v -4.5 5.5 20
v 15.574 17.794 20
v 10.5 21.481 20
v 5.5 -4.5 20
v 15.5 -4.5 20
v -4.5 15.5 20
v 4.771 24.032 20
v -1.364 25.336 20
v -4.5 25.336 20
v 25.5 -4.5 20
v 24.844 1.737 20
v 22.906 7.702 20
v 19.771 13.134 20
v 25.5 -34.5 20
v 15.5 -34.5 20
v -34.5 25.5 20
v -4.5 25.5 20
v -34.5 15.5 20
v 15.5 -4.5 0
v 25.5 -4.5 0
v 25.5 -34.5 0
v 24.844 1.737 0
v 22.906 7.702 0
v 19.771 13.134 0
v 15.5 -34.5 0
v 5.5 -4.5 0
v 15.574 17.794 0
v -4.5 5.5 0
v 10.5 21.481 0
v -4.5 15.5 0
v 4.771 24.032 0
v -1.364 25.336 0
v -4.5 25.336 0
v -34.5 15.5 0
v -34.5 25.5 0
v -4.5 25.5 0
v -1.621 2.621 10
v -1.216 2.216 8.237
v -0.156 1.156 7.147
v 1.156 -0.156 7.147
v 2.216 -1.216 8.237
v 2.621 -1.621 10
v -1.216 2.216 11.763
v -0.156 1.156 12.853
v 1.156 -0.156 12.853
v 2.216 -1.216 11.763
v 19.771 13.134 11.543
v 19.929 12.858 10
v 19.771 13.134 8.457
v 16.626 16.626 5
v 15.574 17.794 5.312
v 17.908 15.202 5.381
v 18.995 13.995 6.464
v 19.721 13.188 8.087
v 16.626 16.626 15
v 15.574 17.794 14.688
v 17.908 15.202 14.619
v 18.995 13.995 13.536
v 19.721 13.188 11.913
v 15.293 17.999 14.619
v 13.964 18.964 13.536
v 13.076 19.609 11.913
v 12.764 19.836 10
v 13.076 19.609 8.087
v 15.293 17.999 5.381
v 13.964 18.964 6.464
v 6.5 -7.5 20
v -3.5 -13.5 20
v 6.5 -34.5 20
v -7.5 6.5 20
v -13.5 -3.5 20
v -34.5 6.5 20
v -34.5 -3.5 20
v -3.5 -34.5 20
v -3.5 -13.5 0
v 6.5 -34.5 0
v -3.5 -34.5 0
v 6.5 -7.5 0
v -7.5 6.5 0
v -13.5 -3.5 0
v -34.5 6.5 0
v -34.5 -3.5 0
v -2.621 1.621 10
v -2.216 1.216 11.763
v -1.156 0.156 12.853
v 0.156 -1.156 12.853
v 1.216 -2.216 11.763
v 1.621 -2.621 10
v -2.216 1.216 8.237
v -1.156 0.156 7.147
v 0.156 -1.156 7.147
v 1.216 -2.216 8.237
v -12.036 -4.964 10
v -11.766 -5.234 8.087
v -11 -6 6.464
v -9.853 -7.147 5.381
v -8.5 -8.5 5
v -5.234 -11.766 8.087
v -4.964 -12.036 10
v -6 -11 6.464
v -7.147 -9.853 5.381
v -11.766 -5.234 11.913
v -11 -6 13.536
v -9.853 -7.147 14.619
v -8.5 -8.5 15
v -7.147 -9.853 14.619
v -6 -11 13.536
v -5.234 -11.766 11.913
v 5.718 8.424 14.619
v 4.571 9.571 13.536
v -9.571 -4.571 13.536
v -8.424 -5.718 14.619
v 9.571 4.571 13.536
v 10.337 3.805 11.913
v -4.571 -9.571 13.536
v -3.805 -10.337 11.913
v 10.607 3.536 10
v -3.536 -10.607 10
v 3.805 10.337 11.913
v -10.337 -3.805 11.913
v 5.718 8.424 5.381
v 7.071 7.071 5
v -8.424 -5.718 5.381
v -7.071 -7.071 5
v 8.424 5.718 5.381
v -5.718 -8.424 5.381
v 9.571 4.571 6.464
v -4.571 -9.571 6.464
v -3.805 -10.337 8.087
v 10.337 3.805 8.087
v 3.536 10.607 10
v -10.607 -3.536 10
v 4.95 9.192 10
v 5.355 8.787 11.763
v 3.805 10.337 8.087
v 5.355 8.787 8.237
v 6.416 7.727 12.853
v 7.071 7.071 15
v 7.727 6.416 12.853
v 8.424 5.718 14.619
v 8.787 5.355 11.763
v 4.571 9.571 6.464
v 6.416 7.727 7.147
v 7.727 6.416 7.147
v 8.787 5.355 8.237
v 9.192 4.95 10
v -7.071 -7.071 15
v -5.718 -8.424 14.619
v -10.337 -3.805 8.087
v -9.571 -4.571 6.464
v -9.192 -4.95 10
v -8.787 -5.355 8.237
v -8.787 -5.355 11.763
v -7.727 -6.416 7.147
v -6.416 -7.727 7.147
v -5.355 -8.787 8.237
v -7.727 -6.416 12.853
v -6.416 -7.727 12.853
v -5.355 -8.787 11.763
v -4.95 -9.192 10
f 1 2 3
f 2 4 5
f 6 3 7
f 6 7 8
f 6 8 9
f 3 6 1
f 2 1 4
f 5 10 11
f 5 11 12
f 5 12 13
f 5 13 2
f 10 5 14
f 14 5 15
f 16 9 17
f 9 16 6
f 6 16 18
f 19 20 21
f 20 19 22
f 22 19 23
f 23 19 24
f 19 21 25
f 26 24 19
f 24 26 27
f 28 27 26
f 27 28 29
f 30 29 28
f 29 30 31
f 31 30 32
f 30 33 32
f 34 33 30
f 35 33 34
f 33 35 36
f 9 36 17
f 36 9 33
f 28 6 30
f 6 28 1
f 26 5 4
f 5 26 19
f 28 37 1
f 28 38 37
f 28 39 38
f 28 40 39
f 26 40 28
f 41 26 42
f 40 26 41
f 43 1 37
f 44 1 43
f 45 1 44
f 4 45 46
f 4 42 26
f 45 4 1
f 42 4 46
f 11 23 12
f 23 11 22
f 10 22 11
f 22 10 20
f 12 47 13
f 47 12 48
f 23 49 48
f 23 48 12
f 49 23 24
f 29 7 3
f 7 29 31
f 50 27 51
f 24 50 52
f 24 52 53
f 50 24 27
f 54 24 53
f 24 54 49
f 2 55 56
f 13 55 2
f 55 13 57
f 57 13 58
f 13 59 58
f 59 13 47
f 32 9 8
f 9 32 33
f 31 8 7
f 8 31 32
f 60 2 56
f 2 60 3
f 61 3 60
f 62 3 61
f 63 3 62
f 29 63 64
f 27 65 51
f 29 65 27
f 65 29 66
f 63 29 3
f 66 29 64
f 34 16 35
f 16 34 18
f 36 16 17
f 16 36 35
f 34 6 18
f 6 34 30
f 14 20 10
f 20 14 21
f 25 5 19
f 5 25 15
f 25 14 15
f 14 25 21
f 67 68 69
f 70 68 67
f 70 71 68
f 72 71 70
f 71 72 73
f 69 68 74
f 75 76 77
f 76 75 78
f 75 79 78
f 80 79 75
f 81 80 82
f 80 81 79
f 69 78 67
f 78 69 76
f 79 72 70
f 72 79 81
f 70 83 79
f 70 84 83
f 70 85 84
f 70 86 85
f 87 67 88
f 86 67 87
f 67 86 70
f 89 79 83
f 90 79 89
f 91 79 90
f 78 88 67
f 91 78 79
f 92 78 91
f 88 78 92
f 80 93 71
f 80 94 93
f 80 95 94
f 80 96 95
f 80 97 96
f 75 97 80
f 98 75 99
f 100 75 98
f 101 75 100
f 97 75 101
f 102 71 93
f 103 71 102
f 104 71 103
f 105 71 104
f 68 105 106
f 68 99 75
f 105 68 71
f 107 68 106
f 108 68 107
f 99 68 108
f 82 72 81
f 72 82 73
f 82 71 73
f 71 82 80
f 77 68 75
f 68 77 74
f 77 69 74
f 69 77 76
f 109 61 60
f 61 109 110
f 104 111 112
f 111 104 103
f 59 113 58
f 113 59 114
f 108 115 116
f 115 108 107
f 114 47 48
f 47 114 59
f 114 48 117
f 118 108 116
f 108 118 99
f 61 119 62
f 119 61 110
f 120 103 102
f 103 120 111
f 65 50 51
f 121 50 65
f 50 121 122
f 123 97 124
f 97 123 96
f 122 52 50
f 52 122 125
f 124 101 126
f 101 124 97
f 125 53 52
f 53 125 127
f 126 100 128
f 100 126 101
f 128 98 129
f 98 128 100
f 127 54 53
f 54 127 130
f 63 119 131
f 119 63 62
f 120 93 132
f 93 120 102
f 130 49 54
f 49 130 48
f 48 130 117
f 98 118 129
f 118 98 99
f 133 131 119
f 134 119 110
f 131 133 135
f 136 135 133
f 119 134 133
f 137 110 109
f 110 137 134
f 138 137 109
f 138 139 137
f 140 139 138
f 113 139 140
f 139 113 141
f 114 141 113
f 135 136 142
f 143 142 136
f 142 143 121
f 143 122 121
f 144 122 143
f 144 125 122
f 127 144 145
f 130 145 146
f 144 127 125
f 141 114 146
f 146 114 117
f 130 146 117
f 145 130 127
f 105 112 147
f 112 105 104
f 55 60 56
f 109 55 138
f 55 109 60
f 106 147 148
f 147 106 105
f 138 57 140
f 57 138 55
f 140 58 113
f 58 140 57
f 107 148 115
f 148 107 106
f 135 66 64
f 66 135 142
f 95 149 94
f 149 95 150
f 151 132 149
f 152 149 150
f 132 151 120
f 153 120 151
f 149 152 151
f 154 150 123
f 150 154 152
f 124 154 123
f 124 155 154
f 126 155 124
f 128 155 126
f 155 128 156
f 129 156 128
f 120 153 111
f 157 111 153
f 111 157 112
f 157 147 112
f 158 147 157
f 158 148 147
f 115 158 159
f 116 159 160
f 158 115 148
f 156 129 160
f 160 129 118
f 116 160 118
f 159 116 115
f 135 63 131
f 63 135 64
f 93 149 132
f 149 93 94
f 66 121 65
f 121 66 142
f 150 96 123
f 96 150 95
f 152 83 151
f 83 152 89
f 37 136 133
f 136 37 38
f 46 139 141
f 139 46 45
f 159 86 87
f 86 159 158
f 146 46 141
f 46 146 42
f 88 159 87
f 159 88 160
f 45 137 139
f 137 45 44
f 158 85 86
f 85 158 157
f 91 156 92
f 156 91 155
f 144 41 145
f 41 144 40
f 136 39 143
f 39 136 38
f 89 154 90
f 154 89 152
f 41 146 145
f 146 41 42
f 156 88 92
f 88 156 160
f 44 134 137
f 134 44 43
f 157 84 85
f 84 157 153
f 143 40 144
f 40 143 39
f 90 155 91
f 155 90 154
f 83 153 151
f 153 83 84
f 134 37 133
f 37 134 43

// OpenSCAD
bh = 20; // max board width 

bw = 10;  // max board width

al = 30; // arm length

tk = 10; // thickners

// --
//
//bc = bw+2*tk;
//
//difference(){
//union(){
//bc = bw+2*tk;
//cube([bc,bc,bh]);
//
//cube([bc+al,tk,bh]);
//
//cube([tk,bc+al,bh]);
//}
//
////kk =2*tk;
//// translate([kk+tk,kk+tk,tk]) rotate([0,0,45]) cube([tk,tk,bh], center=true);
//}
//
//bc1 = tk;
//#translate([bc1+bw,bc1+bw,0]) cube([bc,bc,bh],$fn=3);

//tk 


module p1(d, bh, tk) {


    difference() {
        cube([d,d,bh]);
        rotate([0,0,45]) translate([0,0,bh/2]) cube([sqrt(2)*tk,sqrt(2)*tk,bh], center=true);
    }
}


d = bw + 2*tk;


difference(){
    
    union(){
        
    // part 1 

    translate([-tk*0.45,-tk*0.45,0])
    union(){
        intersection(){
            p1(d,bh,tk);
            cylinder(r=d,h=bh);
        }


        translate([-al,d-tk,0]) cube([al,tk,bh]);
        translate([d-tk,-al,0]) cube([tk,al,bh]);
    }
//
//
//

    // part 2
    translate([tk*0.65,tk*0.65,0]){

        difference(){    
            rotate([0,0,180]) p1(d,bh,tk+4);

            linear_extrude(height=bh) polygon(points=[[-d,-d],[-d,0],[0,-d]]);
        }

        translate([-al*0.9-tk*1.4,-tk,0]) cube([al*0.9,tk,bh]);
        translate([-tk,-al*0.9-tk*1.4, 0]) cube([tk,al*0.9,bh]);
    }
    
    }
    

    // screw 
    translate([0,0,bh/2])
    rotate([90,0,-45]) 
    difference(){   
        cylinder(d=10,h=100,center=true);

    //translate([0,0,40]) 
        difference(){
            cylinder(d=10,h=20,center=true);
            cylinder(d=6,h=20,center=true);
        }
    }

}

// --

//bc = bw+2*tk;
//
//linear_extrude(height=bh)
// polygon(points=[[tk,0],[bc+al,0],[bc+al+3,tk],[bc,tk],[bc,tk+bw],[bc-tk,bc],[tk,bc],[tk,bc+al+3],[0,bc+al], [0,tk] ]);
// 

// -- 

///*
// HALLBAR 2x2 PLATFORM — LONG-SPAR VERSION
//
// Design:
//   Outer frame: 560 x 450 mm, 20x10 mm timber, 20 mm VERTICAL.
//   Internal support grid: TWO CONTINUOUS 10x10 mm spars.
//     - one 560 mm spar
//     - one 430 mm spar
//   No segmented internal cross pieces.
//   Only one centre crossing is used.
//
// The T-joints are END/RAIL connectors: a long spar slides through the
// connector and continues uninterrupted. The connector attaches it to
// the perimeter rail.
//
// Parts:
//   corner x4
//   t_joint x4
//   center_4way x1
//   foot x4
//   optional leg_sleeve x4
//*/
//
//$fn=64;
//
//// ---------- USER PARAMETERS ----------
//outer_x = 560;
//outer_y = 450;
//
//rail_h = 20;       // vertical dimension of 20x10 outer board
//rail_t = 10;       // horizontal thickness
//cross = 10;        // 10x10 spars
//
//leg = 20;          // two 10x10 boards paired
//leg_h = 105;       // 105 + 20 frame = 125 mm overall
//
//fit = 0.35;
//wall = 5.5;
//corner_r = 5;
//gusset_r = 11;
//
//foot_size = 36;
//foot_h = 10;
//foot_wall = 4.5;
//
//screw_d = 4.0;
//
//// ---------- HELPER ----------
//module rb(s=[20,20,20], r=3) {
//    x=s[0]; y=s[1]; z=s[2];
//    r=min(r,min(x,y)/2-0.1);
//    hull() {
//        for(xx=[-1,1],yy=[-1,1])
//            translate([xx*(x/2-r),yy*(y/2-r),0])
//                cylinder(r=r,h=z,center=true);
//    }
//}
//
//// ---------- CORNER ----------
//module corner() {
//    body=rail_t+2*wall+18;
//
//    difference() {
//        union() {
//            translate([0,0,rail_h/2])
//                rb([body,body,rail_h+2*wall],corner_r);
//
//            // large curved cheeks
//            translate([-(body/2-2),0,rail_h/2])
//                rotate([0,90,0])
//                    cylinder(r=gusset_r,h=wall*2,center=true);
//
//            translate([0,-(body/2-2),rail_h/2])
//                rotate([90,0,0])
//                    cylinder(r=gusset_r,h=wall*2,center=true);
//
//            // heavy leg collar
//            translate([0,0,-leg_h/2])
//                rb([leg+2*wall,leg+2*wall,leg_h/3],corner_r);
//        }
//
//        // long rail socket +X
//        translate([body/2-4,0,rail_h/2])
//            cube([body+10,rail_t+2*fit,rail_h+2*fit],center=true);
//
//        // short rail socket +Y
//        translate([0,body/2-4,rail_h/2])
//            cube([rail_t+2*fit,body+10,rail_h+2*fit],center=true);
//
//        // leg socket
//        translate([0,0,-leg_h/2])
//            cube([leg+2*fit,leg+2*fit,leg_h+2],center=true);
//
//        // optional retaining holes
//        translate([body/2-7,0,rail_h/2])
//            rotate([90,0,0])
//                cylinder(d=screw_d,h=rail_t+2*wall+4,center=true);
//
//        translate([0,body/2-7,rail_h/2])
//            rotate([0,90,0])
//                cylinder(d=screw_d,h=rail_t+2*wall+4,center=true);
//    }
//}
//
//// ---------- LONG-SPAR T-JOINT ----------
////
//// The spar passes through the connector.
//// It does NOT need to be cut at the joint.
////
//// The connector sits at the perimeter and captures the 20x10 rail.
//// The 10x10 spar passes through the central tunnel.
////
//// PART IS SYMMETRIC ENOUGH TO ROTATE 180° WHEN ASSEMBLING.
//module t_joint() {
//    L=44;
//    B=32;
//    H=30;
//
//    difference() {
//        union() {
//            // thick body
//            translate([0,0,H/2])
//                rb([L,B,H],5);
//
//            // long curved shoulder along the spar
//            translate([0,0,9])
//                rotate([90,0,0])
//                    cylinder(r=gusset_r,h=B,center=true);
//
//            // second curved shoulder on underside
//            translate([0,0,5])
//                rotate([90,0,0])
//                    cylinder(r=7,h=B+4,center=true);
//        }
//
//        // CONTINUOUS 10x10 spar tunnel, full length
//        translate([0,0,rail_h-cross/2])
//            cube([L+4,cross+2*fit,cross+2*fit],center=true);
//
//        // 20x10 perimeter rail socket, perpendicular
//        translate([0,0,rail_h/2])
//            cube([rail_t+2*fit,B+4,rail_h+2*fit],center=true);
//
//        // retaining screw for the continuous spar
//        translate([0,0,rail_h-cross/2])
//            rotate([90,0,0])
//                cylinder(d=screw_d,h=B+4,center=true);
//
//        // retaining screw for perimeter rail
//        translate([0,0,rail_h/2])
//            rotate([0,90,0])
//                cylinder(d=screw_d,h=L+4,center=true);
//    }
//}
//
//// ---------- CENTER 4-WAY ----------
////
//// The two spars remain single pieces and cross through this hub.
//// No cutting or joining of short pieces.
//module center_4way() {
//    S=42;
//    H=20;
//
//    difference() {
//        union() {
//            rb([S,S,H+2*wall],6);
//
//            // four curved arms
//            for(a=[0,90,180,270])
//                rotate([0,0,a])
//                    translate([S/2-4,0,H/2])
//                        rotate([90,0,0])
//                            cylinder(r=gusset_r,h=wall+1,center=true);
//        }
//
//        // first continuous spar
//        translate([0,0,H-cross/2])
//            cube([S+6,cross+2*fit,cross+2*fit],center=true);
//
//        // second continuous spar
//        translate([0,0,H-cross/2])
//            cube([cross+2*fit,S+6,cross+2*fit],center=true);
//
//        // optional central pin/screw
//        cylinder(d=screw_d,h=H+2*wall+4,center=true);
//    }
//}
//
//// ---------- FOOT ----------
//module foot() {
//    difference() {
//        union() {
//            rb([foot_size,foot_size,foot_h],6);
//
//            translate([0,0,foot_h/2+3])
//                rb([leg+2*foot_wall,leg+2*foot_wall,foot_h+6],4);
//
//            for(a=[0,90,180,270])
//                rotate([0,0,a])
//                    translate([foot_size/2-7,0,foot_h/2])
//                        rotate([90,0,0])
//                            cylinder(r=6,h=foot_wall,center=true);
//        }
//
//        translate([0,0,foot_h+2])
//            cube([leg+2*fit,leg+2*fit,foot_h+10],center=true);
//
//        cylinder(d=8,h=foot_h+4,center=true);
//    }
//}
//
//// ---------- OPTIONAL LEG SLEEVE ----------
//module leg_sleeve() {
//    outer=30;
//    h=25;
//
//    difference() {
//        rb([outer,outer,h],5);
//        cube([leg+2*fit,leg+2*fit,h+2],center=true);
//
//        // split for easy insertion
//        translate([outer/2-2,0,0])
//            cube([8,4,h+4],center=true);
//    }
//}
//
//// ---------- EXPORT ----------
//PART="t_joint";
//
//if(PART=="corner") corner();
//if(PART=="t_joint") t_joint();
//if(PART=="center_4way") center_4way();
//if(PART=="foot") foot();
//if(PART=="leg_sleeve") leg_sleeve();
